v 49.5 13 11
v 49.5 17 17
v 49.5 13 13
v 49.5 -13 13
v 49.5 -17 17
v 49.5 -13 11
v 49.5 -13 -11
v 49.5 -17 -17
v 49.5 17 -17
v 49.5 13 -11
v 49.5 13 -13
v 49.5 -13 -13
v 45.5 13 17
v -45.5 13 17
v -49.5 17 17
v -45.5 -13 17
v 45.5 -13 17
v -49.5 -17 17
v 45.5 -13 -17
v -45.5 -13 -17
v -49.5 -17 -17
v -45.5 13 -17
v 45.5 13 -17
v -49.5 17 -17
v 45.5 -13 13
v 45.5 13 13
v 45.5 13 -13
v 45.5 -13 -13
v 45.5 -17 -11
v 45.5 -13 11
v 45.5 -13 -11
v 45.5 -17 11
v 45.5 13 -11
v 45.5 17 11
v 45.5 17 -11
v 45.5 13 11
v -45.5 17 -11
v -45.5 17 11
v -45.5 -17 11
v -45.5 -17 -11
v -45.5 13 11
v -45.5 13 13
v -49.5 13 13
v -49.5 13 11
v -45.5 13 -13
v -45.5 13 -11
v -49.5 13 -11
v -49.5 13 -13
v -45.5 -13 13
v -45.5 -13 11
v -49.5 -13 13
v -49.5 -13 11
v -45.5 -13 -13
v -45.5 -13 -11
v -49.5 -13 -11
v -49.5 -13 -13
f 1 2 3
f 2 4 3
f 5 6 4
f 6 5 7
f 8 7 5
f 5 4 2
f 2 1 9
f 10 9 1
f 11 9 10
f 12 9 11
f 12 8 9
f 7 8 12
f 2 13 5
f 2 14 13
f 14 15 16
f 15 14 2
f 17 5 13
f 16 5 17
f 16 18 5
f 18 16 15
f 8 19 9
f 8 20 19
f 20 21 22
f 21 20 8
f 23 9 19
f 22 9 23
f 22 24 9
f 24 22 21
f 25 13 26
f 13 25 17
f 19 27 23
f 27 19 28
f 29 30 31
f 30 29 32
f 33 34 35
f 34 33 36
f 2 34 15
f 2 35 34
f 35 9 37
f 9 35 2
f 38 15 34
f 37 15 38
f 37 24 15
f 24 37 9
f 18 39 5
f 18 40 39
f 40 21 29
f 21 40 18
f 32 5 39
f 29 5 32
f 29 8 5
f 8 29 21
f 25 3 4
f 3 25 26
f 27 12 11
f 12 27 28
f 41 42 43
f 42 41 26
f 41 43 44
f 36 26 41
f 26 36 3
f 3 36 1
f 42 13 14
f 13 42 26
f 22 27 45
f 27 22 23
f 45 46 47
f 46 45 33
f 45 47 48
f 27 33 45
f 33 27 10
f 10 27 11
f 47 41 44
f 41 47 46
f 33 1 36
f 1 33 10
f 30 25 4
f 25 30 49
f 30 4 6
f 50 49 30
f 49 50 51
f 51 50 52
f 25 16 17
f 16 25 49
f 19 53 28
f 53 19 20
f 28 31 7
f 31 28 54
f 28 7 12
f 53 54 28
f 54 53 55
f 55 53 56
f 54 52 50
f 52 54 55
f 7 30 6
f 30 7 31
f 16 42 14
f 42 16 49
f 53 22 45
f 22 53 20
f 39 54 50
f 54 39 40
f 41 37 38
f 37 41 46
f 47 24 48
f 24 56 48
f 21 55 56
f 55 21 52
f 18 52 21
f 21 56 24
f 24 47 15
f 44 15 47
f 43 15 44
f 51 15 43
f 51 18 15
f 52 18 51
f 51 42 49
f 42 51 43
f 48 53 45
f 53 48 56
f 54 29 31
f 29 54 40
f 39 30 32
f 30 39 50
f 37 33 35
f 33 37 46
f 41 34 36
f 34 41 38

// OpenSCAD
// Camera bumper for the forearm camera (SO-101 robot, docs/camera_bumper.md). OpenSCAD.
// A cage round the camera body: four corner rails and a square ring at each end. The camera slides in from the lens side and sits 0.5 mm inside the rails.
// These are the dimensions that were simulated (sim/model.py GUARD, see the document); change the camera numbers to the camera you actually buy.
cam_len  = 90;      // camera body, along its long side (D435 / OAK-D Lite class: 90 x 25 x 25 mm)
cam_h    = 25;      // camera body height
cam_d    = 25;      // camera body depth (from the lens plane back)
gap      = 0.5;     // clearance between the camera and the cage
rail_r   = 4;       // rail thickness, radial (this is how far the cage stands proud of the camera: gap + rail_r = 4.5 mm)
rail_t   = 6;       // rail width, tangential (the simulation has 4: a wider rail is stronger against the 40-60 N that the floor pushed with in the falls)
ring_len = 4;       // ring length along the camera
ring_w   = 4;       // ring wall
$fn = 24;

inner_h = cam_h + 2 * gap;  inner_d = cam_d + 2 * gap;           // the opening the camera sits in
outer_h = inner_h + 2 * rail_r;  outer_d = inner_d + 2 * rail_r;
total   = cam_len + 2 * gap + 2 * ring_len;                      // along the camera

module ring(x) {                                                 // a square frame at one end
    translate([x, 0, 0]) difference() {
        cube([ring_len, outer_h, outer_d], center = true);
        cube([ring_len + 1, inner_h + 2 * (rail_r - ring_w), inner_d + 2 * (rail_r - ring_w)], center = true);
    }
}
module rail(sy, sz) {                                            // an L-shaped corner rail, rail_r thick, rail_t long on each face
    translate([0, sy * (inner_h / 2 + rail_r / 2), sz * (inner_d / 2 + rail_r / 2)])  cube([total, rail_r, rail_r], center = true);
    translate([0, sy * (inner_h / 2 + rail_r / 2), sz * (inner_d / 2 - rail_t / 2 + rail_r)]) cube([total, rail_r, rail_t], center = true);
}
union() {
    ring( (cam_len / 2 + gap + ring_len / 2));
    ring(-(cam_len / 2 + gap + ring_len / 2));
    for (sy = [-1, 1]) for (sz = [-1, 1]) rail(sy, sz);
}
// print on its side, PETG or PLA+, 4 perimeters, 40 % infill. About 14 g.
